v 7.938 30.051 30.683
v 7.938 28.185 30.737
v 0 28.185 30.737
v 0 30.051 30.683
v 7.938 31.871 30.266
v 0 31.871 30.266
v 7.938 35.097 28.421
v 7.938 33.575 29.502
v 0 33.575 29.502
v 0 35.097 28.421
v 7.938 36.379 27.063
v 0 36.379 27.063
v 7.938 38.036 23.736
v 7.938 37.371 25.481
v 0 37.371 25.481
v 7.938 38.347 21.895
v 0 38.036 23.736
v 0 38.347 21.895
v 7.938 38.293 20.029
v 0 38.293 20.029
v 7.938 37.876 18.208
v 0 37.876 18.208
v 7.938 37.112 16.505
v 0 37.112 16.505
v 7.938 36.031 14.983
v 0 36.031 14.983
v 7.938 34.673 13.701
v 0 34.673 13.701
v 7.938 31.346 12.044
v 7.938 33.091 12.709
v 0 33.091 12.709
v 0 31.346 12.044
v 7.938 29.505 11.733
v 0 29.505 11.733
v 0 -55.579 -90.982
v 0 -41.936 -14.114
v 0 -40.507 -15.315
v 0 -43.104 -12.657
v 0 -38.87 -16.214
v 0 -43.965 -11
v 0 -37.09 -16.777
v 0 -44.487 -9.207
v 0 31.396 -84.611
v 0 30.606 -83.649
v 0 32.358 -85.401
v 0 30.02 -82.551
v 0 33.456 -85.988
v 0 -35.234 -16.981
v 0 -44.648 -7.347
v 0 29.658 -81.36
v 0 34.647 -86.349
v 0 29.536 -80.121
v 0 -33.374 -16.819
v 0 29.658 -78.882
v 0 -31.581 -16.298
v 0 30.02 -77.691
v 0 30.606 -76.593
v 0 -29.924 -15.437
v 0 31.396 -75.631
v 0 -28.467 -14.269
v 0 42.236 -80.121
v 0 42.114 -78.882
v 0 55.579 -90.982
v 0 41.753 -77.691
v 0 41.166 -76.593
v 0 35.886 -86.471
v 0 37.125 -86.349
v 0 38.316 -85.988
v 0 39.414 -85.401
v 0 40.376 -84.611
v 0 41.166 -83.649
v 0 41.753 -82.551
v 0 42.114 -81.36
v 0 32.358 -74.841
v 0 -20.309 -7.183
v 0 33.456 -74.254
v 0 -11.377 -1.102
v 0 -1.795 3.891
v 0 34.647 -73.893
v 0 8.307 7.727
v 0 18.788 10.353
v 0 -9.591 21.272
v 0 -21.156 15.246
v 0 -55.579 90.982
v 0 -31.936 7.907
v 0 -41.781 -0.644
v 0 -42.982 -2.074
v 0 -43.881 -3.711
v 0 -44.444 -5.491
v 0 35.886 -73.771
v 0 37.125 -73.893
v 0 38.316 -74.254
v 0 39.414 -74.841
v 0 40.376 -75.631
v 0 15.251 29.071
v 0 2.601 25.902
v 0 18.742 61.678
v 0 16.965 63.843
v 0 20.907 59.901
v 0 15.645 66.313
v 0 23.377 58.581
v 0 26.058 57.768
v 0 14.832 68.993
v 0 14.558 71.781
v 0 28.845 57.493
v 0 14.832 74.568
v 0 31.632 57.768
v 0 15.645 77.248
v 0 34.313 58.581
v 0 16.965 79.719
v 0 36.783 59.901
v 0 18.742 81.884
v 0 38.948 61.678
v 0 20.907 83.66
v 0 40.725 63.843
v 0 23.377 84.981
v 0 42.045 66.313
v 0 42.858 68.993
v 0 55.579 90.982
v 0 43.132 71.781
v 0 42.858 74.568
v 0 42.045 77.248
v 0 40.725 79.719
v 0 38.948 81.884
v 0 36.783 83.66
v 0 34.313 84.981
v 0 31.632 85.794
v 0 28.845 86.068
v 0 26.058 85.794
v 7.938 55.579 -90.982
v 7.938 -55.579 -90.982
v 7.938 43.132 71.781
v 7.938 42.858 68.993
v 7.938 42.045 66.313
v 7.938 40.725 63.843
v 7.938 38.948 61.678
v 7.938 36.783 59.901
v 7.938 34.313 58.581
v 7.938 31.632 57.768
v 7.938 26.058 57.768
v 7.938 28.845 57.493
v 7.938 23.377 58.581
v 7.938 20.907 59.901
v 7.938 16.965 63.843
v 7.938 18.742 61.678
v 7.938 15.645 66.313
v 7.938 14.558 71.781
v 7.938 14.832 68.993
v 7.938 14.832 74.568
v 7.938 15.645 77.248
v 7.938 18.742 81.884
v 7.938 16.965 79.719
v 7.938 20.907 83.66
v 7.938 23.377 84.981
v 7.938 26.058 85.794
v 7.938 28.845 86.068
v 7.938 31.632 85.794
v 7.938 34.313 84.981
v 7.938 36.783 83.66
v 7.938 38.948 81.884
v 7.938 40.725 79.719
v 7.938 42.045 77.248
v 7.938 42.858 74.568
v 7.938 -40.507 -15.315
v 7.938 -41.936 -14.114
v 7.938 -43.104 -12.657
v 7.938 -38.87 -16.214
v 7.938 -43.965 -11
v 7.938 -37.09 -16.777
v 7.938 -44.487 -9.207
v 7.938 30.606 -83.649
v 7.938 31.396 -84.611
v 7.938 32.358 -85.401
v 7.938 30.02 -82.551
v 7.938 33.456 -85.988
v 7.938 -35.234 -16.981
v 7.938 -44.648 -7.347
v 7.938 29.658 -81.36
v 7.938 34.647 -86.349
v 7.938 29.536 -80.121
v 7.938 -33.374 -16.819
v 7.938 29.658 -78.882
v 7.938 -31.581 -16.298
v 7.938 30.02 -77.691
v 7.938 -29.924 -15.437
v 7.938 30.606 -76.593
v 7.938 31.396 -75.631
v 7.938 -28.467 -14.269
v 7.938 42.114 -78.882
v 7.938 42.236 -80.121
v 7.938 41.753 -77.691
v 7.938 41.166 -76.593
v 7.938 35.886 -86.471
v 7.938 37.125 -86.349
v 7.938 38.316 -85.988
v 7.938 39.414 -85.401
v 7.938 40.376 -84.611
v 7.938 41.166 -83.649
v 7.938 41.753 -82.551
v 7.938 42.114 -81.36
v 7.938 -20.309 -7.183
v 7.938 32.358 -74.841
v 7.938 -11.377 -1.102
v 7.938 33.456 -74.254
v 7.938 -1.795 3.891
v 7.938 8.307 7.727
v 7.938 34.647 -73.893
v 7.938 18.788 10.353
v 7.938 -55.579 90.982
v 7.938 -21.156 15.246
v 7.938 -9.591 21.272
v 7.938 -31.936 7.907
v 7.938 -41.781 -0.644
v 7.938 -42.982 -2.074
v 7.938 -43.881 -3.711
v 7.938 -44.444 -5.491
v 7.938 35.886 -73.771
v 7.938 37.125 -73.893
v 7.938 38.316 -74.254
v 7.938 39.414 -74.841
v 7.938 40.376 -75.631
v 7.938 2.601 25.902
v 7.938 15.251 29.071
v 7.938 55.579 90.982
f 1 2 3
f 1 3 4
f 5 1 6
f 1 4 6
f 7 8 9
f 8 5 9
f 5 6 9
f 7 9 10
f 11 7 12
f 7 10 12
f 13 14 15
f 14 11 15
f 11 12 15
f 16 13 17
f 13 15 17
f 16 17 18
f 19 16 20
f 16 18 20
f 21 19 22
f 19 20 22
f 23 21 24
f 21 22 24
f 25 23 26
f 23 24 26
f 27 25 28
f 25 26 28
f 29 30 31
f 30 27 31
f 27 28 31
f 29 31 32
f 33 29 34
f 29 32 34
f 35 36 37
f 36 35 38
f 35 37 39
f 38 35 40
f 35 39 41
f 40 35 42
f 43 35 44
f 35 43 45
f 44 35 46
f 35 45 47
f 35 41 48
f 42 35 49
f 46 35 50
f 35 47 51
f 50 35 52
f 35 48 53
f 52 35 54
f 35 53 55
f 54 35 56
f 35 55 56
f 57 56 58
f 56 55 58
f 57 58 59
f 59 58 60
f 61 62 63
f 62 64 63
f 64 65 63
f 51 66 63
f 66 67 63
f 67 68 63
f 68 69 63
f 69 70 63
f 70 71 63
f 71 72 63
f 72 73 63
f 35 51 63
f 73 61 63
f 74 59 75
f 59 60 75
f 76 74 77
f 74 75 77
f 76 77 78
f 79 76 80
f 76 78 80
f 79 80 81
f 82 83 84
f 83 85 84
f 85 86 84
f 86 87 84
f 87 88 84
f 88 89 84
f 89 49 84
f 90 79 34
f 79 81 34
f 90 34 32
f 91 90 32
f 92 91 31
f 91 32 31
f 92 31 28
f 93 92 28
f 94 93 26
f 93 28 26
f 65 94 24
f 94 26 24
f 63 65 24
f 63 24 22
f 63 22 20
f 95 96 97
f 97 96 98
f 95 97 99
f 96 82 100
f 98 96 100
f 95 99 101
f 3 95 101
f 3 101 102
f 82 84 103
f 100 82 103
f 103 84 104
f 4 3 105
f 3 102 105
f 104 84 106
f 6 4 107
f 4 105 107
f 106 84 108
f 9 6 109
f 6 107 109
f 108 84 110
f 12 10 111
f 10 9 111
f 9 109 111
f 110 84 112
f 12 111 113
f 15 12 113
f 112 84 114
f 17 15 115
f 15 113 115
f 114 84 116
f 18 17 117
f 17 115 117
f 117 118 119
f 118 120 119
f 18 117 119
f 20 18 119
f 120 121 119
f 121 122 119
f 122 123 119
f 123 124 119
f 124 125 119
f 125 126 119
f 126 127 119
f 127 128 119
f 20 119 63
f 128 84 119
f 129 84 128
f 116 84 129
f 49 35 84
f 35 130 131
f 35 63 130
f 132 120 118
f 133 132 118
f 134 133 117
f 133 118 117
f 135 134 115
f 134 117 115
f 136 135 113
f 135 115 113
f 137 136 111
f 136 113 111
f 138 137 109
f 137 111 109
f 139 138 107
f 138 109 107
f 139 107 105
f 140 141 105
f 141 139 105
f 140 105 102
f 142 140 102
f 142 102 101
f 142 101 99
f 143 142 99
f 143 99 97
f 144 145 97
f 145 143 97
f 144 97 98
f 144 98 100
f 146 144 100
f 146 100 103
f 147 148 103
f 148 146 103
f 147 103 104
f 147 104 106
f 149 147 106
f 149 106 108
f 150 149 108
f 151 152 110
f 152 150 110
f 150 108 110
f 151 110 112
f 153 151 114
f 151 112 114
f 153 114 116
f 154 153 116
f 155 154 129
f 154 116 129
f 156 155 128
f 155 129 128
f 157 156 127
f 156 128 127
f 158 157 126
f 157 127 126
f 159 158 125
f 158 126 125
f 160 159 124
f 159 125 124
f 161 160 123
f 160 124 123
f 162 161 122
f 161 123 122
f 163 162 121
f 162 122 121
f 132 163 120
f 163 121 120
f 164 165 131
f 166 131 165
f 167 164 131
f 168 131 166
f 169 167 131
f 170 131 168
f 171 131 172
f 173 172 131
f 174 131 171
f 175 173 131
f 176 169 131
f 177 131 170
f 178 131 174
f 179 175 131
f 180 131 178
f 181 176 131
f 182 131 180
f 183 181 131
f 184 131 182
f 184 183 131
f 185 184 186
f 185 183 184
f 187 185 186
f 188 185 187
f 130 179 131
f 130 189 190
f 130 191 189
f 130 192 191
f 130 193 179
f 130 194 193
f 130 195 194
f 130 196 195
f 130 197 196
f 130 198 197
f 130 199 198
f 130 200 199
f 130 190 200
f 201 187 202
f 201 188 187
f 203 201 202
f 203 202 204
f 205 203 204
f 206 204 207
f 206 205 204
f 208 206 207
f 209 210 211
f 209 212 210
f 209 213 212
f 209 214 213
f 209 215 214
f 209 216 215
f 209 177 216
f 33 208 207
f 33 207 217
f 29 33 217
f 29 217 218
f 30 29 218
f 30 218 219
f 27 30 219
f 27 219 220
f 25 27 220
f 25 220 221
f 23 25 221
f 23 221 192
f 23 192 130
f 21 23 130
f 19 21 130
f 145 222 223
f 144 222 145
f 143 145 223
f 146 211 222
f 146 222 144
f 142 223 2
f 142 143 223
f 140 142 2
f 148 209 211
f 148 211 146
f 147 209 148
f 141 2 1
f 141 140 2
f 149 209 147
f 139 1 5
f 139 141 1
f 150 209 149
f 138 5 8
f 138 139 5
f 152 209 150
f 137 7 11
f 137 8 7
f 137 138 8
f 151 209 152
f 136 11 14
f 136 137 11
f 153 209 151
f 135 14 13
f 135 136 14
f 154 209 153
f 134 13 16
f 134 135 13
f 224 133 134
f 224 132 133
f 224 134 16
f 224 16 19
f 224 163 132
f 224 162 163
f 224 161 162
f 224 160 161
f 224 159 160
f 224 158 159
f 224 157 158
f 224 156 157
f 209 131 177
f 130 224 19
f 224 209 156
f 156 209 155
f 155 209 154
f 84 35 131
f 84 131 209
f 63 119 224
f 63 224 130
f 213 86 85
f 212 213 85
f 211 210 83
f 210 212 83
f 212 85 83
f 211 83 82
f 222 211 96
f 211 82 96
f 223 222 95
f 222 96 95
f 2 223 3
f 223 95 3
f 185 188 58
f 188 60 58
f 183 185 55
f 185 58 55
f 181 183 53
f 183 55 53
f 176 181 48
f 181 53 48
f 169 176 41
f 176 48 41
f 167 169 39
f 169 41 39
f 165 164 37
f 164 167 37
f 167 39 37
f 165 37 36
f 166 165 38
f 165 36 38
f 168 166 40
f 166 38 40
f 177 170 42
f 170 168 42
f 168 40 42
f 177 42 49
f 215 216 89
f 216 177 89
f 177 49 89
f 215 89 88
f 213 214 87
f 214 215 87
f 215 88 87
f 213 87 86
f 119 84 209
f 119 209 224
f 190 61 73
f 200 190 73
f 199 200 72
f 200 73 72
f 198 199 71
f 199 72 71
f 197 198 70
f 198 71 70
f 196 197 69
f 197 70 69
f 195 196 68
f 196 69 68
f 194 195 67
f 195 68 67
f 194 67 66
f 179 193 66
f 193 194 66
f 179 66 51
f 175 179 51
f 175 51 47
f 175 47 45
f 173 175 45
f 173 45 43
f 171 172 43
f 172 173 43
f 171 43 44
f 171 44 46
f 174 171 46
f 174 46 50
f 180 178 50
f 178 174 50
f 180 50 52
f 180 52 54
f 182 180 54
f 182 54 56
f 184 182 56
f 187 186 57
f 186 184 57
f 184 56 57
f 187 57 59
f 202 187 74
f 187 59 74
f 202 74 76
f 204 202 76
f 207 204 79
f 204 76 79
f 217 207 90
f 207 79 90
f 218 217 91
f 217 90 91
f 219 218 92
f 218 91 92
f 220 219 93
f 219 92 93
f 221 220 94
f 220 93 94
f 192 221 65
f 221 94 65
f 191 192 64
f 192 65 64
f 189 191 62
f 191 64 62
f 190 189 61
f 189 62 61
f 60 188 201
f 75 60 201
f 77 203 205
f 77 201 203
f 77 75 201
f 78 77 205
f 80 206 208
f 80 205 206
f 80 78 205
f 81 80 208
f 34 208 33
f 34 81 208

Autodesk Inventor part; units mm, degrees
ref_plane "YZ Plane" through (0, 0, 0) normal (1, 0, 0) x (0, 1, 0)
ref_plane "XZ Plane" through (0, 0, 0) normal (0, 1, 0) x (-1, 0, 0)
ref_plane "XY Plane" through (0, 0, 0) normal (0, 0, 1) x (1, 0, 0)
sketch "Sketch1" plane through (0, 0, 0) normal (1, 0, 0) x (0, 1, 0)
  line L0 (-55.5791, 90.9825) -> (55.5791, 90.9825)
  line L1 (55.5791, 90.9825) -> (55.5791, -90.9825)
  line L2 (55.5791, -90.9825) -> (-55.5791, -90.9825)
  line L3 (-55.5791, -90.9825) -> (-55.5791, 90.9825)
  line L4 (-55.5791, 90.9825) -> (55.5791, -90.9825) construction
  line L5 (55.5791, 90.9825) -> (-55.5791, -90.9825) construction
  circle A0 centre (35.8863, -80.1209) radius 6.35
  arc A1 (28.845, 21.2348) -> (-35.1241, -7.4567) centre (35.8863, -80.1209) ccw construction
  arc A2 (28.1849, 30.7369) -> (-41.7813, -0.6445) centre (35.8863, -80.1209) ccw
  arc A3 (29.5052, 11.7327) -> (-28.4669, -14.269) centre (35.8863, -80.1209) ccw
  arc A4 (29.5052, 11.7327) -> (28.1849, 30.7369) centre (28.845, 21.2348) ccw
  arc A5 (-41.7813, -0.6445) -> (-28.4669, -14.269) centre (-35.1241, -7.4567) ccw
  circle A6 centre (28.845, 71.7808) radius 14.2875
  point P0 (0, 0)
  dimension "d2" = 12.7
  dimension "d3" = 101.6
  dimension "d4" = 19.05
  dimension "d5" = 28.575
  dimension "d9" = 50.546
  dimension "d10" = 0
  dimension "d11" = 181.965
  dimension "d12" = 111.1583
extrude "Extrusion1" add sketch "Sketch1" along normal blind 7.9375
properties part number "side_plate" material "Steel"
